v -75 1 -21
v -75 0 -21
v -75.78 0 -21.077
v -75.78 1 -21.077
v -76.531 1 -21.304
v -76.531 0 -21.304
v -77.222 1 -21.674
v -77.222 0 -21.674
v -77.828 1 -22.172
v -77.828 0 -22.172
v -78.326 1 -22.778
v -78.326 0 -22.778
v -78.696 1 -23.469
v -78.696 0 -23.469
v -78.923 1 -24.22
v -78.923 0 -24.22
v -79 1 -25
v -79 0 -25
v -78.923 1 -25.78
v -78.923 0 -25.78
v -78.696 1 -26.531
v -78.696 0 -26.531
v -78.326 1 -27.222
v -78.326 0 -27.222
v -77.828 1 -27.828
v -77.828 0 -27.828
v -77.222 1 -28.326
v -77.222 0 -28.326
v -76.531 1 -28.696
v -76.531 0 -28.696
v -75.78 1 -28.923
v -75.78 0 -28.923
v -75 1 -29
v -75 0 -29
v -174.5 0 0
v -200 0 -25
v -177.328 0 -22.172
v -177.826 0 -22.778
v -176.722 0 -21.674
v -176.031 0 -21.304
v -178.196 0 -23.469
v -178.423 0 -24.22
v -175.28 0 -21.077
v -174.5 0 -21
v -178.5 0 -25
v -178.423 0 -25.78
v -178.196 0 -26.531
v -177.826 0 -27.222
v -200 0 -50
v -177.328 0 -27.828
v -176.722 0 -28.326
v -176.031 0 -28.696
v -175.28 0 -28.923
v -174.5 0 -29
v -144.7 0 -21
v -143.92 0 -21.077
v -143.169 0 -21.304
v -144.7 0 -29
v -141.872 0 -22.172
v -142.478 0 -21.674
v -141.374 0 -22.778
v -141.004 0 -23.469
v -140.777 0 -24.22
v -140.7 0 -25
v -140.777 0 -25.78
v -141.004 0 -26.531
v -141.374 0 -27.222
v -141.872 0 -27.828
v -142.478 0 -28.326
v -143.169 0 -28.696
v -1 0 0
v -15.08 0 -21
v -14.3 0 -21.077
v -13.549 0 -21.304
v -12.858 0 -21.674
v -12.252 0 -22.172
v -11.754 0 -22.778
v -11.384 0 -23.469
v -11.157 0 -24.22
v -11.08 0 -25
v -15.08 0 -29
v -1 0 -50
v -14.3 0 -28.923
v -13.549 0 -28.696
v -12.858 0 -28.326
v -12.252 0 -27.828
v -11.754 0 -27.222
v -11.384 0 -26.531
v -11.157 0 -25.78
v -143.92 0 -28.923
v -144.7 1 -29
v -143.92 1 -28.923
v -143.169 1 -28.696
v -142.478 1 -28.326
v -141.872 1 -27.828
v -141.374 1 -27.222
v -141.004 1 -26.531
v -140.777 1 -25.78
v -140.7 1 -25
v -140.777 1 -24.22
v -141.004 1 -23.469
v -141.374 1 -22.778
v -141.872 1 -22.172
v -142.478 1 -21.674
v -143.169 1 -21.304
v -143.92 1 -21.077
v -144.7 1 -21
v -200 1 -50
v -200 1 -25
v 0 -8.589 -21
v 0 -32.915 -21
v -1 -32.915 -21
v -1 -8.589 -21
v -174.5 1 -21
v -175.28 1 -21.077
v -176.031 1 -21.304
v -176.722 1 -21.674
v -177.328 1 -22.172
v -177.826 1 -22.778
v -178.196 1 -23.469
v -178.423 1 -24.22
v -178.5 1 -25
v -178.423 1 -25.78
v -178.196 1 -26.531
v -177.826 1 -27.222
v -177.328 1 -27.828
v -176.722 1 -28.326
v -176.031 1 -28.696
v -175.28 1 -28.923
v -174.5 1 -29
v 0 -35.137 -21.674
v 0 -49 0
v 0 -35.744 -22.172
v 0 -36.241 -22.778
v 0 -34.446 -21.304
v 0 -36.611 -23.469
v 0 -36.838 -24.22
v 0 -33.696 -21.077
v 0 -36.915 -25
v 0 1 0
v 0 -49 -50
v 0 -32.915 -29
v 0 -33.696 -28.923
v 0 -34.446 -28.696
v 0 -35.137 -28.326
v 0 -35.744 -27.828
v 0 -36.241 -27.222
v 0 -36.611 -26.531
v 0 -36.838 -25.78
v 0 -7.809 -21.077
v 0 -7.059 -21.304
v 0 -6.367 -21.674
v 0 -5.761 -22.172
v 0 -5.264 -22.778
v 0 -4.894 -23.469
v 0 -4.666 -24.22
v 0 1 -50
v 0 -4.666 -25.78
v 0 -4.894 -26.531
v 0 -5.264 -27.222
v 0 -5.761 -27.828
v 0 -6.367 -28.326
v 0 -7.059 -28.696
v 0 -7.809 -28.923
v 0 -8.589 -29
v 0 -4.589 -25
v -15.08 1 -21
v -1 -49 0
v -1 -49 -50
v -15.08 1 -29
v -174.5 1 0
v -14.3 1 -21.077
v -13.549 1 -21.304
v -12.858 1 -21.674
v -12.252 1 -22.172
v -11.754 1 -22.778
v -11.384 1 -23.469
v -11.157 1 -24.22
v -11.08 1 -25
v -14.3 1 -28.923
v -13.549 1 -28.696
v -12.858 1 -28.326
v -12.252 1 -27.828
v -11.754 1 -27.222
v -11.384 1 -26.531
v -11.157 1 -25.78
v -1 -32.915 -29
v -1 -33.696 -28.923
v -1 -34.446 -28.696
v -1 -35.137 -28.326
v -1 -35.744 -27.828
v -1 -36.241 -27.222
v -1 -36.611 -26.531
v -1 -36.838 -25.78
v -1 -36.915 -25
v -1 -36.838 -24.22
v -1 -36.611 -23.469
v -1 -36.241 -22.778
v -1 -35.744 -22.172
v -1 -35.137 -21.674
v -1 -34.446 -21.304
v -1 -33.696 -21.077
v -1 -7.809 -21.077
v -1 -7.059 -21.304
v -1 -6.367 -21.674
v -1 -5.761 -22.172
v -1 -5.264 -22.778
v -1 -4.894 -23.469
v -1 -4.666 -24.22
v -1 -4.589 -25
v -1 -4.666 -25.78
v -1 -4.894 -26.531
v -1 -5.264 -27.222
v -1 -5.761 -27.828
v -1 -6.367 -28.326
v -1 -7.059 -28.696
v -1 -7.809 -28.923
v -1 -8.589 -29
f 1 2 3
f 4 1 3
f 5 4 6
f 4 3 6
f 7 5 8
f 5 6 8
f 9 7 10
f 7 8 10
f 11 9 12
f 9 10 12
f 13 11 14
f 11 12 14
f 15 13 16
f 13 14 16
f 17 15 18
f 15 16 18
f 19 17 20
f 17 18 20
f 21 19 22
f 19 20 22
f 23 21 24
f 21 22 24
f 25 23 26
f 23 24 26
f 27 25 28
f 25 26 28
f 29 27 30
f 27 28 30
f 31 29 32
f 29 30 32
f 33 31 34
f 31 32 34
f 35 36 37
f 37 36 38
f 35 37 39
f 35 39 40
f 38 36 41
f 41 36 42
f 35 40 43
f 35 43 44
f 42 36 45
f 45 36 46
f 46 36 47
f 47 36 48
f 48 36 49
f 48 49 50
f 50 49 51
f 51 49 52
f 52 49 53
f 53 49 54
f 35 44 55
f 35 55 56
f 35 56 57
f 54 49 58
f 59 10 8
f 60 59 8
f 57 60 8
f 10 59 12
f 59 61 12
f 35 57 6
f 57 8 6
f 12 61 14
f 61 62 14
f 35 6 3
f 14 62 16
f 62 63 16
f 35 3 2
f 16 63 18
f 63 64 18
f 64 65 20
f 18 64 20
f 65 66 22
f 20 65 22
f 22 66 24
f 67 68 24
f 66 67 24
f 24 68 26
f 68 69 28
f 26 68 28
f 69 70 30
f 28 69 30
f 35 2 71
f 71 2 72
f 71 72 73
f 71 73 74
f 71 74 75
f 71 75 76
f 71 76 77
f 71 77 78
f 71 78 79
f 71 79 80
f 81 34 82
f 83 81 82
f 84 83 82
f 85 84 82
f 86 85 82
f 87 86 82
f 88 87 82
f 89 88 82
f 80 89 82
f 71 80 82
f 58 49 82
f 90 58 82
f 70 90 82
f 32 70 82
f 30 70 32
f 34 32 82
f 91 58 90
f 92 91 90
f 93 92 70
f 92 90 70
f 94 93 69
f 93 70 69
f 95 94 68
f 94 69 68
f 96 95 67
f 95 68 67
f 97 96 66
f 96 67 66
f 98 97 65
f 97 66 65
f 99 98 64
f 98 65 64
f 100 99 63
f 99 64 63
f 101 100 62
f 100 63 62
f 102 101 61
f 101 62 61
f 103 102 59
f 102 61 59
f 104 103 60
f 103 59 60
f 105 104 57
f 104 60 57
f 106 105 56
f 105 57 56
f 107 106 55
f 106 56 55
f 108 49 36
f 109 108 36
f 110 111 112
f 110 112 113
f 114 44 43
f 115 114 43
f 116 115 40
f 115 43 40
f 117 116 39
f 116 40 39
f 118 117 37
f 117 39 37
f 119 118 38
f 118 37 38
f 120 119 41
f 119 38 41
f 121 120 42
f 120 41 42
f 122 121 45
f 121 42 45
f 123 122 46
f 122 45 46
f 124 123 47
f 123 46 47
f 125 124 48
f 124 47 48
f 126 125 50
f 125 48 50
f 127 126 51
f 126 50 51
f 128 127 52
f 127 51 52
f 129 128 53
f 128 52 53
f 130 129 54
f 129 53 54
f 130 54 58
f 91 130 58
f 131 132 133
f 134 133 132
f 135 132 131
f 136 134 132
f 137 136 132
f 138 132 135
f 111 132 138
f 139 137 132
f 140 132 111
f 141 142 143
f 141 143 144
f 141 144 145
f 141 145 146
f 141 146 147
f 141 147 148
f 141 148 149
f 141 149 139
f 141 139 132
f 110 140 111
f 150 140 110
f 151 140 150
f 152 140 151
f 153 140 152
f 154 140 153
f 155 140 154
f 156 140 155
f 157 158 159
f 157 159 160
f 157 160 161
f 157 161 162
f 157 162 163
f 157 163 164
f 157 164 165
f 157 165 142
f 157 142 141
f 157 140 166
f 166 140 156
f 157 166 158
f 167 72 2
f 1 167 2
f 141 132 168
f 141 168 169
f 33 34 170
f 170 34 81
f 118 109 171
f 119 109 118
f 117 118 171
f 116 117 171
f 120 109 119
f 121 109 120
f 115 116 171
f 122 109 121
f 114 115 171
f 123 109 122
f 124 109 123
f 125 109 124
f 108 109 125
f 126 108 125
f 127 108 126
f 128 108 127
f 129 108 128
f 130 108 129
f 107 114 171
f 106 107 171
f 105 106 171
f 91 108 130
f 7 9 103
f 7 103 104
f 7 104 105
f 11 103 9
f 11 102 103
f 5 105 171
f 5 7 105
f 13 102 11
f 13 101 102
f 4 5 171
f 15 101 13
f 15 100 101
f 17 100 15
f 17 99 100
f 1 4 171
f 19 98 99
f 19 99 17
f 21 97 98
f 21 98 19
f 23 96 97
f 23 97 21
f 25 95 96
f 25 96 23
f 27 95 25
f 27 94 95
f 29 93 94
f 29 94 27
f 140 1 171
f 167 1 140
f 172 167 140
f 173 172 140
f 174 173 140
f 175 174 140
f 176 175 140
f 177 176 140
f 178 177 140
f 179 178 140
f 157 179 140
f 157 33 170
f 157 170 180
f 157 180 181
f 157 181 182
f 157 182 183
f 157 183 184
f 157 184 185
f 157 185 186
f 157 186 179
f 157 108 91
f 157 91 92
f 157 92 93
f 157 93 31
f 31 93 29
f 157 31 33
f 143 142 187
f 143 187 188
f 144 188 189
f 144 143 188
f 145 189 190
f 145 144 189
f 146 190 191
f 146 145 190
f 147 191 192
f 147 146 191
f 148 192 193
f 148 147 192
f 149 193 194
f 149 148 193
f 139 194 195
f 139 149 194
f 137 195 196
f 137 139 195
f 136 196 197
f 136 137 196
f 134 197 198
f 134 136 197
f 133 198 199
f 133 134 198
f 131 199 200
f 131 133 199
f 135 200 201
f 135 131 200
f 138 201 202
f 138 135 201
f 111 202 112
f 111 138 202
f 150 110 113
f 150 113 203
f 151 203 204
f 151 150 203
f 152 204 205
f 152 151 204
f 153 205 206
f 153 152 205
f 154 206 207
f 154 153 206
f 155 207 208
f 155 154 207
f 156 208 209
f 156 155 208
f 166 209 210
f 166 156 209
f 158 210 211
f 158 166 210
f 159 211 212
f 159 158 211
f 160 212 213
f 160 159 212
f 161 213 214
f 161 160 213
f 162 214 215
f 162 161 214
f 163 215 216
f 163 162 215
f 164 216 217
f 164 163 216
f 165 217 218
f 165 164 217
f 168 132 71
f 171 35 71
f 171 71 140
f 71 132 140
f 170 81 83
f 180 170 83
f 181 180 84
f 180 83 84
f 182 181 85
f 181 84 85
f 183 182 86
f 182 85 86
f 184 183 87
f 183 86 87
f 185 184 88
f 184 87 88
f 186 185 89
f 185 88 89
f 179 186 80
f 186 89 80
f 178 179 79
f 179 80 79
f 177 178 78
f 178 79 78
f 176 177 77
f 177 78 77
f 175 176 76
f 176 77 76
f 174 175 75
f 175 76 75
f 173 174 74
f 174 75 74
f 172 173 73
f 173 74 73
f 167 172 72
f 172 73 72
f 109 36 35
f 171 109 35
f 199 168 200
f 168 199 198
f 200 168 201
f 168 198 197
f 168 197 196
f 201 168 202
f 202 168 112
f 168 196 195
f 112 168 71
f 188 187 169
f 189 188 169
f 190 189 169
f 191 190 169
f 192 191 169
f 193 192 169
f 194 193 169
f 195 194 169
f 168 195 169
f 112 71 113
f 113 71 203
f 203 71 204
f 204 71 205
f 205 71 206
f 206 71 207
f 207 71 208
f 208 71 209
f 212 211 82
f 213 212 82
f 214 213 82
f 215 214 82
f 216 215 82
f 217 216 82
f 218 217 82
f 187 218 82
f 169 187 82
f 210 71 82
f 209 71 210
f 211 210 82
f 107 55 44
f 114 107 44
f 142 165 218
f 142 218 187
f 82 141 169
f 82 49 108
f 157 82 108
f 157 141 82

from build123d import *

# Parameters (mm, degrees)
BOSS_EXTRUDE1_DEPTH = 1
SKETCH2_W           = 50
SKETCH2_H           = 50
BOSS_EXTRUDE2_DEPTH = 1
CUT_EXTRUDE1_DEPTH  = 1


with BuildPart() as part:
    # Sketch1 → Boss-Extrude1 (new body)
    with BuildSketch(Plane(origin=(0, 0, 0), x_dir=(1, 0, 0), z_dir=(0, 1, 0))):
        Polygon((-200, 25), (-174.5, 0), (0, 0), (0, 50), (-200, 50), align=None)
        with BuildLine():
            ThreePointArc((-174.5, 21), (-178.5, 25), (-174.5, 29))
            Line((-174.5, 29), (-144.7, 29))
            ThreePointArc((-144.7, 29), (-140.7, 25), (-144.7, 21))
            Line((-144.7, 21), (-174.5, 21))
        make_face(mode=Mode.SUBTRACT)
        with BuildLine():
            ThreePointArc((-75, 21), (-79, 25), (-75, 29))
            Line((-75, 29), (-15.08, 29))
            ThreePointArc((-15.08, 29), (-11.08, 25), (-15.08, 21))
            Line((-15.08, 21), (-75, 21))
        make_face(mode=Mode.SUBTRACT)
    extrude(amount=BOSS_EXTRUDE1_DEPTH)

    # Sketch2 → Boss-Extrude2 (add)
    with BuildSketch(Plane(origin=(0, 0, 0), x_dir=(0, 0, -1), z_dir=(1, 0, 0))):
        with Locations((25, -24)):
            Rectangle(SKETCH2_W, SKETCH2_H)
    extrude(amount=-BOSS_EXTRUDE2_DEPTH)

    # Sketch3 → Cut-Extrude1 (cut)
    with BuildSketch(Plane(origin=(0, 0, 0), x_dir=(0, 0, -1), z_dir=(1, 0, 0))):
        with BuildLine():
            Line((29, -8.58942274), (29, -32.915209985))
            ThreePointArc((29, -32.915209985), (25, -36.915209985), (21, -32.915209985))
            Line((21, -32.915209985), (21, -8.58942274))
            ThreePointArc((21, -8.58942274), (25, -4.58942274), (29, -8.58942274))
        make_face()
    extrude(amount=-CUT_EXTRUDE1_DEPTH, mode=Mode.SUBTRACT)


solid = part.part
